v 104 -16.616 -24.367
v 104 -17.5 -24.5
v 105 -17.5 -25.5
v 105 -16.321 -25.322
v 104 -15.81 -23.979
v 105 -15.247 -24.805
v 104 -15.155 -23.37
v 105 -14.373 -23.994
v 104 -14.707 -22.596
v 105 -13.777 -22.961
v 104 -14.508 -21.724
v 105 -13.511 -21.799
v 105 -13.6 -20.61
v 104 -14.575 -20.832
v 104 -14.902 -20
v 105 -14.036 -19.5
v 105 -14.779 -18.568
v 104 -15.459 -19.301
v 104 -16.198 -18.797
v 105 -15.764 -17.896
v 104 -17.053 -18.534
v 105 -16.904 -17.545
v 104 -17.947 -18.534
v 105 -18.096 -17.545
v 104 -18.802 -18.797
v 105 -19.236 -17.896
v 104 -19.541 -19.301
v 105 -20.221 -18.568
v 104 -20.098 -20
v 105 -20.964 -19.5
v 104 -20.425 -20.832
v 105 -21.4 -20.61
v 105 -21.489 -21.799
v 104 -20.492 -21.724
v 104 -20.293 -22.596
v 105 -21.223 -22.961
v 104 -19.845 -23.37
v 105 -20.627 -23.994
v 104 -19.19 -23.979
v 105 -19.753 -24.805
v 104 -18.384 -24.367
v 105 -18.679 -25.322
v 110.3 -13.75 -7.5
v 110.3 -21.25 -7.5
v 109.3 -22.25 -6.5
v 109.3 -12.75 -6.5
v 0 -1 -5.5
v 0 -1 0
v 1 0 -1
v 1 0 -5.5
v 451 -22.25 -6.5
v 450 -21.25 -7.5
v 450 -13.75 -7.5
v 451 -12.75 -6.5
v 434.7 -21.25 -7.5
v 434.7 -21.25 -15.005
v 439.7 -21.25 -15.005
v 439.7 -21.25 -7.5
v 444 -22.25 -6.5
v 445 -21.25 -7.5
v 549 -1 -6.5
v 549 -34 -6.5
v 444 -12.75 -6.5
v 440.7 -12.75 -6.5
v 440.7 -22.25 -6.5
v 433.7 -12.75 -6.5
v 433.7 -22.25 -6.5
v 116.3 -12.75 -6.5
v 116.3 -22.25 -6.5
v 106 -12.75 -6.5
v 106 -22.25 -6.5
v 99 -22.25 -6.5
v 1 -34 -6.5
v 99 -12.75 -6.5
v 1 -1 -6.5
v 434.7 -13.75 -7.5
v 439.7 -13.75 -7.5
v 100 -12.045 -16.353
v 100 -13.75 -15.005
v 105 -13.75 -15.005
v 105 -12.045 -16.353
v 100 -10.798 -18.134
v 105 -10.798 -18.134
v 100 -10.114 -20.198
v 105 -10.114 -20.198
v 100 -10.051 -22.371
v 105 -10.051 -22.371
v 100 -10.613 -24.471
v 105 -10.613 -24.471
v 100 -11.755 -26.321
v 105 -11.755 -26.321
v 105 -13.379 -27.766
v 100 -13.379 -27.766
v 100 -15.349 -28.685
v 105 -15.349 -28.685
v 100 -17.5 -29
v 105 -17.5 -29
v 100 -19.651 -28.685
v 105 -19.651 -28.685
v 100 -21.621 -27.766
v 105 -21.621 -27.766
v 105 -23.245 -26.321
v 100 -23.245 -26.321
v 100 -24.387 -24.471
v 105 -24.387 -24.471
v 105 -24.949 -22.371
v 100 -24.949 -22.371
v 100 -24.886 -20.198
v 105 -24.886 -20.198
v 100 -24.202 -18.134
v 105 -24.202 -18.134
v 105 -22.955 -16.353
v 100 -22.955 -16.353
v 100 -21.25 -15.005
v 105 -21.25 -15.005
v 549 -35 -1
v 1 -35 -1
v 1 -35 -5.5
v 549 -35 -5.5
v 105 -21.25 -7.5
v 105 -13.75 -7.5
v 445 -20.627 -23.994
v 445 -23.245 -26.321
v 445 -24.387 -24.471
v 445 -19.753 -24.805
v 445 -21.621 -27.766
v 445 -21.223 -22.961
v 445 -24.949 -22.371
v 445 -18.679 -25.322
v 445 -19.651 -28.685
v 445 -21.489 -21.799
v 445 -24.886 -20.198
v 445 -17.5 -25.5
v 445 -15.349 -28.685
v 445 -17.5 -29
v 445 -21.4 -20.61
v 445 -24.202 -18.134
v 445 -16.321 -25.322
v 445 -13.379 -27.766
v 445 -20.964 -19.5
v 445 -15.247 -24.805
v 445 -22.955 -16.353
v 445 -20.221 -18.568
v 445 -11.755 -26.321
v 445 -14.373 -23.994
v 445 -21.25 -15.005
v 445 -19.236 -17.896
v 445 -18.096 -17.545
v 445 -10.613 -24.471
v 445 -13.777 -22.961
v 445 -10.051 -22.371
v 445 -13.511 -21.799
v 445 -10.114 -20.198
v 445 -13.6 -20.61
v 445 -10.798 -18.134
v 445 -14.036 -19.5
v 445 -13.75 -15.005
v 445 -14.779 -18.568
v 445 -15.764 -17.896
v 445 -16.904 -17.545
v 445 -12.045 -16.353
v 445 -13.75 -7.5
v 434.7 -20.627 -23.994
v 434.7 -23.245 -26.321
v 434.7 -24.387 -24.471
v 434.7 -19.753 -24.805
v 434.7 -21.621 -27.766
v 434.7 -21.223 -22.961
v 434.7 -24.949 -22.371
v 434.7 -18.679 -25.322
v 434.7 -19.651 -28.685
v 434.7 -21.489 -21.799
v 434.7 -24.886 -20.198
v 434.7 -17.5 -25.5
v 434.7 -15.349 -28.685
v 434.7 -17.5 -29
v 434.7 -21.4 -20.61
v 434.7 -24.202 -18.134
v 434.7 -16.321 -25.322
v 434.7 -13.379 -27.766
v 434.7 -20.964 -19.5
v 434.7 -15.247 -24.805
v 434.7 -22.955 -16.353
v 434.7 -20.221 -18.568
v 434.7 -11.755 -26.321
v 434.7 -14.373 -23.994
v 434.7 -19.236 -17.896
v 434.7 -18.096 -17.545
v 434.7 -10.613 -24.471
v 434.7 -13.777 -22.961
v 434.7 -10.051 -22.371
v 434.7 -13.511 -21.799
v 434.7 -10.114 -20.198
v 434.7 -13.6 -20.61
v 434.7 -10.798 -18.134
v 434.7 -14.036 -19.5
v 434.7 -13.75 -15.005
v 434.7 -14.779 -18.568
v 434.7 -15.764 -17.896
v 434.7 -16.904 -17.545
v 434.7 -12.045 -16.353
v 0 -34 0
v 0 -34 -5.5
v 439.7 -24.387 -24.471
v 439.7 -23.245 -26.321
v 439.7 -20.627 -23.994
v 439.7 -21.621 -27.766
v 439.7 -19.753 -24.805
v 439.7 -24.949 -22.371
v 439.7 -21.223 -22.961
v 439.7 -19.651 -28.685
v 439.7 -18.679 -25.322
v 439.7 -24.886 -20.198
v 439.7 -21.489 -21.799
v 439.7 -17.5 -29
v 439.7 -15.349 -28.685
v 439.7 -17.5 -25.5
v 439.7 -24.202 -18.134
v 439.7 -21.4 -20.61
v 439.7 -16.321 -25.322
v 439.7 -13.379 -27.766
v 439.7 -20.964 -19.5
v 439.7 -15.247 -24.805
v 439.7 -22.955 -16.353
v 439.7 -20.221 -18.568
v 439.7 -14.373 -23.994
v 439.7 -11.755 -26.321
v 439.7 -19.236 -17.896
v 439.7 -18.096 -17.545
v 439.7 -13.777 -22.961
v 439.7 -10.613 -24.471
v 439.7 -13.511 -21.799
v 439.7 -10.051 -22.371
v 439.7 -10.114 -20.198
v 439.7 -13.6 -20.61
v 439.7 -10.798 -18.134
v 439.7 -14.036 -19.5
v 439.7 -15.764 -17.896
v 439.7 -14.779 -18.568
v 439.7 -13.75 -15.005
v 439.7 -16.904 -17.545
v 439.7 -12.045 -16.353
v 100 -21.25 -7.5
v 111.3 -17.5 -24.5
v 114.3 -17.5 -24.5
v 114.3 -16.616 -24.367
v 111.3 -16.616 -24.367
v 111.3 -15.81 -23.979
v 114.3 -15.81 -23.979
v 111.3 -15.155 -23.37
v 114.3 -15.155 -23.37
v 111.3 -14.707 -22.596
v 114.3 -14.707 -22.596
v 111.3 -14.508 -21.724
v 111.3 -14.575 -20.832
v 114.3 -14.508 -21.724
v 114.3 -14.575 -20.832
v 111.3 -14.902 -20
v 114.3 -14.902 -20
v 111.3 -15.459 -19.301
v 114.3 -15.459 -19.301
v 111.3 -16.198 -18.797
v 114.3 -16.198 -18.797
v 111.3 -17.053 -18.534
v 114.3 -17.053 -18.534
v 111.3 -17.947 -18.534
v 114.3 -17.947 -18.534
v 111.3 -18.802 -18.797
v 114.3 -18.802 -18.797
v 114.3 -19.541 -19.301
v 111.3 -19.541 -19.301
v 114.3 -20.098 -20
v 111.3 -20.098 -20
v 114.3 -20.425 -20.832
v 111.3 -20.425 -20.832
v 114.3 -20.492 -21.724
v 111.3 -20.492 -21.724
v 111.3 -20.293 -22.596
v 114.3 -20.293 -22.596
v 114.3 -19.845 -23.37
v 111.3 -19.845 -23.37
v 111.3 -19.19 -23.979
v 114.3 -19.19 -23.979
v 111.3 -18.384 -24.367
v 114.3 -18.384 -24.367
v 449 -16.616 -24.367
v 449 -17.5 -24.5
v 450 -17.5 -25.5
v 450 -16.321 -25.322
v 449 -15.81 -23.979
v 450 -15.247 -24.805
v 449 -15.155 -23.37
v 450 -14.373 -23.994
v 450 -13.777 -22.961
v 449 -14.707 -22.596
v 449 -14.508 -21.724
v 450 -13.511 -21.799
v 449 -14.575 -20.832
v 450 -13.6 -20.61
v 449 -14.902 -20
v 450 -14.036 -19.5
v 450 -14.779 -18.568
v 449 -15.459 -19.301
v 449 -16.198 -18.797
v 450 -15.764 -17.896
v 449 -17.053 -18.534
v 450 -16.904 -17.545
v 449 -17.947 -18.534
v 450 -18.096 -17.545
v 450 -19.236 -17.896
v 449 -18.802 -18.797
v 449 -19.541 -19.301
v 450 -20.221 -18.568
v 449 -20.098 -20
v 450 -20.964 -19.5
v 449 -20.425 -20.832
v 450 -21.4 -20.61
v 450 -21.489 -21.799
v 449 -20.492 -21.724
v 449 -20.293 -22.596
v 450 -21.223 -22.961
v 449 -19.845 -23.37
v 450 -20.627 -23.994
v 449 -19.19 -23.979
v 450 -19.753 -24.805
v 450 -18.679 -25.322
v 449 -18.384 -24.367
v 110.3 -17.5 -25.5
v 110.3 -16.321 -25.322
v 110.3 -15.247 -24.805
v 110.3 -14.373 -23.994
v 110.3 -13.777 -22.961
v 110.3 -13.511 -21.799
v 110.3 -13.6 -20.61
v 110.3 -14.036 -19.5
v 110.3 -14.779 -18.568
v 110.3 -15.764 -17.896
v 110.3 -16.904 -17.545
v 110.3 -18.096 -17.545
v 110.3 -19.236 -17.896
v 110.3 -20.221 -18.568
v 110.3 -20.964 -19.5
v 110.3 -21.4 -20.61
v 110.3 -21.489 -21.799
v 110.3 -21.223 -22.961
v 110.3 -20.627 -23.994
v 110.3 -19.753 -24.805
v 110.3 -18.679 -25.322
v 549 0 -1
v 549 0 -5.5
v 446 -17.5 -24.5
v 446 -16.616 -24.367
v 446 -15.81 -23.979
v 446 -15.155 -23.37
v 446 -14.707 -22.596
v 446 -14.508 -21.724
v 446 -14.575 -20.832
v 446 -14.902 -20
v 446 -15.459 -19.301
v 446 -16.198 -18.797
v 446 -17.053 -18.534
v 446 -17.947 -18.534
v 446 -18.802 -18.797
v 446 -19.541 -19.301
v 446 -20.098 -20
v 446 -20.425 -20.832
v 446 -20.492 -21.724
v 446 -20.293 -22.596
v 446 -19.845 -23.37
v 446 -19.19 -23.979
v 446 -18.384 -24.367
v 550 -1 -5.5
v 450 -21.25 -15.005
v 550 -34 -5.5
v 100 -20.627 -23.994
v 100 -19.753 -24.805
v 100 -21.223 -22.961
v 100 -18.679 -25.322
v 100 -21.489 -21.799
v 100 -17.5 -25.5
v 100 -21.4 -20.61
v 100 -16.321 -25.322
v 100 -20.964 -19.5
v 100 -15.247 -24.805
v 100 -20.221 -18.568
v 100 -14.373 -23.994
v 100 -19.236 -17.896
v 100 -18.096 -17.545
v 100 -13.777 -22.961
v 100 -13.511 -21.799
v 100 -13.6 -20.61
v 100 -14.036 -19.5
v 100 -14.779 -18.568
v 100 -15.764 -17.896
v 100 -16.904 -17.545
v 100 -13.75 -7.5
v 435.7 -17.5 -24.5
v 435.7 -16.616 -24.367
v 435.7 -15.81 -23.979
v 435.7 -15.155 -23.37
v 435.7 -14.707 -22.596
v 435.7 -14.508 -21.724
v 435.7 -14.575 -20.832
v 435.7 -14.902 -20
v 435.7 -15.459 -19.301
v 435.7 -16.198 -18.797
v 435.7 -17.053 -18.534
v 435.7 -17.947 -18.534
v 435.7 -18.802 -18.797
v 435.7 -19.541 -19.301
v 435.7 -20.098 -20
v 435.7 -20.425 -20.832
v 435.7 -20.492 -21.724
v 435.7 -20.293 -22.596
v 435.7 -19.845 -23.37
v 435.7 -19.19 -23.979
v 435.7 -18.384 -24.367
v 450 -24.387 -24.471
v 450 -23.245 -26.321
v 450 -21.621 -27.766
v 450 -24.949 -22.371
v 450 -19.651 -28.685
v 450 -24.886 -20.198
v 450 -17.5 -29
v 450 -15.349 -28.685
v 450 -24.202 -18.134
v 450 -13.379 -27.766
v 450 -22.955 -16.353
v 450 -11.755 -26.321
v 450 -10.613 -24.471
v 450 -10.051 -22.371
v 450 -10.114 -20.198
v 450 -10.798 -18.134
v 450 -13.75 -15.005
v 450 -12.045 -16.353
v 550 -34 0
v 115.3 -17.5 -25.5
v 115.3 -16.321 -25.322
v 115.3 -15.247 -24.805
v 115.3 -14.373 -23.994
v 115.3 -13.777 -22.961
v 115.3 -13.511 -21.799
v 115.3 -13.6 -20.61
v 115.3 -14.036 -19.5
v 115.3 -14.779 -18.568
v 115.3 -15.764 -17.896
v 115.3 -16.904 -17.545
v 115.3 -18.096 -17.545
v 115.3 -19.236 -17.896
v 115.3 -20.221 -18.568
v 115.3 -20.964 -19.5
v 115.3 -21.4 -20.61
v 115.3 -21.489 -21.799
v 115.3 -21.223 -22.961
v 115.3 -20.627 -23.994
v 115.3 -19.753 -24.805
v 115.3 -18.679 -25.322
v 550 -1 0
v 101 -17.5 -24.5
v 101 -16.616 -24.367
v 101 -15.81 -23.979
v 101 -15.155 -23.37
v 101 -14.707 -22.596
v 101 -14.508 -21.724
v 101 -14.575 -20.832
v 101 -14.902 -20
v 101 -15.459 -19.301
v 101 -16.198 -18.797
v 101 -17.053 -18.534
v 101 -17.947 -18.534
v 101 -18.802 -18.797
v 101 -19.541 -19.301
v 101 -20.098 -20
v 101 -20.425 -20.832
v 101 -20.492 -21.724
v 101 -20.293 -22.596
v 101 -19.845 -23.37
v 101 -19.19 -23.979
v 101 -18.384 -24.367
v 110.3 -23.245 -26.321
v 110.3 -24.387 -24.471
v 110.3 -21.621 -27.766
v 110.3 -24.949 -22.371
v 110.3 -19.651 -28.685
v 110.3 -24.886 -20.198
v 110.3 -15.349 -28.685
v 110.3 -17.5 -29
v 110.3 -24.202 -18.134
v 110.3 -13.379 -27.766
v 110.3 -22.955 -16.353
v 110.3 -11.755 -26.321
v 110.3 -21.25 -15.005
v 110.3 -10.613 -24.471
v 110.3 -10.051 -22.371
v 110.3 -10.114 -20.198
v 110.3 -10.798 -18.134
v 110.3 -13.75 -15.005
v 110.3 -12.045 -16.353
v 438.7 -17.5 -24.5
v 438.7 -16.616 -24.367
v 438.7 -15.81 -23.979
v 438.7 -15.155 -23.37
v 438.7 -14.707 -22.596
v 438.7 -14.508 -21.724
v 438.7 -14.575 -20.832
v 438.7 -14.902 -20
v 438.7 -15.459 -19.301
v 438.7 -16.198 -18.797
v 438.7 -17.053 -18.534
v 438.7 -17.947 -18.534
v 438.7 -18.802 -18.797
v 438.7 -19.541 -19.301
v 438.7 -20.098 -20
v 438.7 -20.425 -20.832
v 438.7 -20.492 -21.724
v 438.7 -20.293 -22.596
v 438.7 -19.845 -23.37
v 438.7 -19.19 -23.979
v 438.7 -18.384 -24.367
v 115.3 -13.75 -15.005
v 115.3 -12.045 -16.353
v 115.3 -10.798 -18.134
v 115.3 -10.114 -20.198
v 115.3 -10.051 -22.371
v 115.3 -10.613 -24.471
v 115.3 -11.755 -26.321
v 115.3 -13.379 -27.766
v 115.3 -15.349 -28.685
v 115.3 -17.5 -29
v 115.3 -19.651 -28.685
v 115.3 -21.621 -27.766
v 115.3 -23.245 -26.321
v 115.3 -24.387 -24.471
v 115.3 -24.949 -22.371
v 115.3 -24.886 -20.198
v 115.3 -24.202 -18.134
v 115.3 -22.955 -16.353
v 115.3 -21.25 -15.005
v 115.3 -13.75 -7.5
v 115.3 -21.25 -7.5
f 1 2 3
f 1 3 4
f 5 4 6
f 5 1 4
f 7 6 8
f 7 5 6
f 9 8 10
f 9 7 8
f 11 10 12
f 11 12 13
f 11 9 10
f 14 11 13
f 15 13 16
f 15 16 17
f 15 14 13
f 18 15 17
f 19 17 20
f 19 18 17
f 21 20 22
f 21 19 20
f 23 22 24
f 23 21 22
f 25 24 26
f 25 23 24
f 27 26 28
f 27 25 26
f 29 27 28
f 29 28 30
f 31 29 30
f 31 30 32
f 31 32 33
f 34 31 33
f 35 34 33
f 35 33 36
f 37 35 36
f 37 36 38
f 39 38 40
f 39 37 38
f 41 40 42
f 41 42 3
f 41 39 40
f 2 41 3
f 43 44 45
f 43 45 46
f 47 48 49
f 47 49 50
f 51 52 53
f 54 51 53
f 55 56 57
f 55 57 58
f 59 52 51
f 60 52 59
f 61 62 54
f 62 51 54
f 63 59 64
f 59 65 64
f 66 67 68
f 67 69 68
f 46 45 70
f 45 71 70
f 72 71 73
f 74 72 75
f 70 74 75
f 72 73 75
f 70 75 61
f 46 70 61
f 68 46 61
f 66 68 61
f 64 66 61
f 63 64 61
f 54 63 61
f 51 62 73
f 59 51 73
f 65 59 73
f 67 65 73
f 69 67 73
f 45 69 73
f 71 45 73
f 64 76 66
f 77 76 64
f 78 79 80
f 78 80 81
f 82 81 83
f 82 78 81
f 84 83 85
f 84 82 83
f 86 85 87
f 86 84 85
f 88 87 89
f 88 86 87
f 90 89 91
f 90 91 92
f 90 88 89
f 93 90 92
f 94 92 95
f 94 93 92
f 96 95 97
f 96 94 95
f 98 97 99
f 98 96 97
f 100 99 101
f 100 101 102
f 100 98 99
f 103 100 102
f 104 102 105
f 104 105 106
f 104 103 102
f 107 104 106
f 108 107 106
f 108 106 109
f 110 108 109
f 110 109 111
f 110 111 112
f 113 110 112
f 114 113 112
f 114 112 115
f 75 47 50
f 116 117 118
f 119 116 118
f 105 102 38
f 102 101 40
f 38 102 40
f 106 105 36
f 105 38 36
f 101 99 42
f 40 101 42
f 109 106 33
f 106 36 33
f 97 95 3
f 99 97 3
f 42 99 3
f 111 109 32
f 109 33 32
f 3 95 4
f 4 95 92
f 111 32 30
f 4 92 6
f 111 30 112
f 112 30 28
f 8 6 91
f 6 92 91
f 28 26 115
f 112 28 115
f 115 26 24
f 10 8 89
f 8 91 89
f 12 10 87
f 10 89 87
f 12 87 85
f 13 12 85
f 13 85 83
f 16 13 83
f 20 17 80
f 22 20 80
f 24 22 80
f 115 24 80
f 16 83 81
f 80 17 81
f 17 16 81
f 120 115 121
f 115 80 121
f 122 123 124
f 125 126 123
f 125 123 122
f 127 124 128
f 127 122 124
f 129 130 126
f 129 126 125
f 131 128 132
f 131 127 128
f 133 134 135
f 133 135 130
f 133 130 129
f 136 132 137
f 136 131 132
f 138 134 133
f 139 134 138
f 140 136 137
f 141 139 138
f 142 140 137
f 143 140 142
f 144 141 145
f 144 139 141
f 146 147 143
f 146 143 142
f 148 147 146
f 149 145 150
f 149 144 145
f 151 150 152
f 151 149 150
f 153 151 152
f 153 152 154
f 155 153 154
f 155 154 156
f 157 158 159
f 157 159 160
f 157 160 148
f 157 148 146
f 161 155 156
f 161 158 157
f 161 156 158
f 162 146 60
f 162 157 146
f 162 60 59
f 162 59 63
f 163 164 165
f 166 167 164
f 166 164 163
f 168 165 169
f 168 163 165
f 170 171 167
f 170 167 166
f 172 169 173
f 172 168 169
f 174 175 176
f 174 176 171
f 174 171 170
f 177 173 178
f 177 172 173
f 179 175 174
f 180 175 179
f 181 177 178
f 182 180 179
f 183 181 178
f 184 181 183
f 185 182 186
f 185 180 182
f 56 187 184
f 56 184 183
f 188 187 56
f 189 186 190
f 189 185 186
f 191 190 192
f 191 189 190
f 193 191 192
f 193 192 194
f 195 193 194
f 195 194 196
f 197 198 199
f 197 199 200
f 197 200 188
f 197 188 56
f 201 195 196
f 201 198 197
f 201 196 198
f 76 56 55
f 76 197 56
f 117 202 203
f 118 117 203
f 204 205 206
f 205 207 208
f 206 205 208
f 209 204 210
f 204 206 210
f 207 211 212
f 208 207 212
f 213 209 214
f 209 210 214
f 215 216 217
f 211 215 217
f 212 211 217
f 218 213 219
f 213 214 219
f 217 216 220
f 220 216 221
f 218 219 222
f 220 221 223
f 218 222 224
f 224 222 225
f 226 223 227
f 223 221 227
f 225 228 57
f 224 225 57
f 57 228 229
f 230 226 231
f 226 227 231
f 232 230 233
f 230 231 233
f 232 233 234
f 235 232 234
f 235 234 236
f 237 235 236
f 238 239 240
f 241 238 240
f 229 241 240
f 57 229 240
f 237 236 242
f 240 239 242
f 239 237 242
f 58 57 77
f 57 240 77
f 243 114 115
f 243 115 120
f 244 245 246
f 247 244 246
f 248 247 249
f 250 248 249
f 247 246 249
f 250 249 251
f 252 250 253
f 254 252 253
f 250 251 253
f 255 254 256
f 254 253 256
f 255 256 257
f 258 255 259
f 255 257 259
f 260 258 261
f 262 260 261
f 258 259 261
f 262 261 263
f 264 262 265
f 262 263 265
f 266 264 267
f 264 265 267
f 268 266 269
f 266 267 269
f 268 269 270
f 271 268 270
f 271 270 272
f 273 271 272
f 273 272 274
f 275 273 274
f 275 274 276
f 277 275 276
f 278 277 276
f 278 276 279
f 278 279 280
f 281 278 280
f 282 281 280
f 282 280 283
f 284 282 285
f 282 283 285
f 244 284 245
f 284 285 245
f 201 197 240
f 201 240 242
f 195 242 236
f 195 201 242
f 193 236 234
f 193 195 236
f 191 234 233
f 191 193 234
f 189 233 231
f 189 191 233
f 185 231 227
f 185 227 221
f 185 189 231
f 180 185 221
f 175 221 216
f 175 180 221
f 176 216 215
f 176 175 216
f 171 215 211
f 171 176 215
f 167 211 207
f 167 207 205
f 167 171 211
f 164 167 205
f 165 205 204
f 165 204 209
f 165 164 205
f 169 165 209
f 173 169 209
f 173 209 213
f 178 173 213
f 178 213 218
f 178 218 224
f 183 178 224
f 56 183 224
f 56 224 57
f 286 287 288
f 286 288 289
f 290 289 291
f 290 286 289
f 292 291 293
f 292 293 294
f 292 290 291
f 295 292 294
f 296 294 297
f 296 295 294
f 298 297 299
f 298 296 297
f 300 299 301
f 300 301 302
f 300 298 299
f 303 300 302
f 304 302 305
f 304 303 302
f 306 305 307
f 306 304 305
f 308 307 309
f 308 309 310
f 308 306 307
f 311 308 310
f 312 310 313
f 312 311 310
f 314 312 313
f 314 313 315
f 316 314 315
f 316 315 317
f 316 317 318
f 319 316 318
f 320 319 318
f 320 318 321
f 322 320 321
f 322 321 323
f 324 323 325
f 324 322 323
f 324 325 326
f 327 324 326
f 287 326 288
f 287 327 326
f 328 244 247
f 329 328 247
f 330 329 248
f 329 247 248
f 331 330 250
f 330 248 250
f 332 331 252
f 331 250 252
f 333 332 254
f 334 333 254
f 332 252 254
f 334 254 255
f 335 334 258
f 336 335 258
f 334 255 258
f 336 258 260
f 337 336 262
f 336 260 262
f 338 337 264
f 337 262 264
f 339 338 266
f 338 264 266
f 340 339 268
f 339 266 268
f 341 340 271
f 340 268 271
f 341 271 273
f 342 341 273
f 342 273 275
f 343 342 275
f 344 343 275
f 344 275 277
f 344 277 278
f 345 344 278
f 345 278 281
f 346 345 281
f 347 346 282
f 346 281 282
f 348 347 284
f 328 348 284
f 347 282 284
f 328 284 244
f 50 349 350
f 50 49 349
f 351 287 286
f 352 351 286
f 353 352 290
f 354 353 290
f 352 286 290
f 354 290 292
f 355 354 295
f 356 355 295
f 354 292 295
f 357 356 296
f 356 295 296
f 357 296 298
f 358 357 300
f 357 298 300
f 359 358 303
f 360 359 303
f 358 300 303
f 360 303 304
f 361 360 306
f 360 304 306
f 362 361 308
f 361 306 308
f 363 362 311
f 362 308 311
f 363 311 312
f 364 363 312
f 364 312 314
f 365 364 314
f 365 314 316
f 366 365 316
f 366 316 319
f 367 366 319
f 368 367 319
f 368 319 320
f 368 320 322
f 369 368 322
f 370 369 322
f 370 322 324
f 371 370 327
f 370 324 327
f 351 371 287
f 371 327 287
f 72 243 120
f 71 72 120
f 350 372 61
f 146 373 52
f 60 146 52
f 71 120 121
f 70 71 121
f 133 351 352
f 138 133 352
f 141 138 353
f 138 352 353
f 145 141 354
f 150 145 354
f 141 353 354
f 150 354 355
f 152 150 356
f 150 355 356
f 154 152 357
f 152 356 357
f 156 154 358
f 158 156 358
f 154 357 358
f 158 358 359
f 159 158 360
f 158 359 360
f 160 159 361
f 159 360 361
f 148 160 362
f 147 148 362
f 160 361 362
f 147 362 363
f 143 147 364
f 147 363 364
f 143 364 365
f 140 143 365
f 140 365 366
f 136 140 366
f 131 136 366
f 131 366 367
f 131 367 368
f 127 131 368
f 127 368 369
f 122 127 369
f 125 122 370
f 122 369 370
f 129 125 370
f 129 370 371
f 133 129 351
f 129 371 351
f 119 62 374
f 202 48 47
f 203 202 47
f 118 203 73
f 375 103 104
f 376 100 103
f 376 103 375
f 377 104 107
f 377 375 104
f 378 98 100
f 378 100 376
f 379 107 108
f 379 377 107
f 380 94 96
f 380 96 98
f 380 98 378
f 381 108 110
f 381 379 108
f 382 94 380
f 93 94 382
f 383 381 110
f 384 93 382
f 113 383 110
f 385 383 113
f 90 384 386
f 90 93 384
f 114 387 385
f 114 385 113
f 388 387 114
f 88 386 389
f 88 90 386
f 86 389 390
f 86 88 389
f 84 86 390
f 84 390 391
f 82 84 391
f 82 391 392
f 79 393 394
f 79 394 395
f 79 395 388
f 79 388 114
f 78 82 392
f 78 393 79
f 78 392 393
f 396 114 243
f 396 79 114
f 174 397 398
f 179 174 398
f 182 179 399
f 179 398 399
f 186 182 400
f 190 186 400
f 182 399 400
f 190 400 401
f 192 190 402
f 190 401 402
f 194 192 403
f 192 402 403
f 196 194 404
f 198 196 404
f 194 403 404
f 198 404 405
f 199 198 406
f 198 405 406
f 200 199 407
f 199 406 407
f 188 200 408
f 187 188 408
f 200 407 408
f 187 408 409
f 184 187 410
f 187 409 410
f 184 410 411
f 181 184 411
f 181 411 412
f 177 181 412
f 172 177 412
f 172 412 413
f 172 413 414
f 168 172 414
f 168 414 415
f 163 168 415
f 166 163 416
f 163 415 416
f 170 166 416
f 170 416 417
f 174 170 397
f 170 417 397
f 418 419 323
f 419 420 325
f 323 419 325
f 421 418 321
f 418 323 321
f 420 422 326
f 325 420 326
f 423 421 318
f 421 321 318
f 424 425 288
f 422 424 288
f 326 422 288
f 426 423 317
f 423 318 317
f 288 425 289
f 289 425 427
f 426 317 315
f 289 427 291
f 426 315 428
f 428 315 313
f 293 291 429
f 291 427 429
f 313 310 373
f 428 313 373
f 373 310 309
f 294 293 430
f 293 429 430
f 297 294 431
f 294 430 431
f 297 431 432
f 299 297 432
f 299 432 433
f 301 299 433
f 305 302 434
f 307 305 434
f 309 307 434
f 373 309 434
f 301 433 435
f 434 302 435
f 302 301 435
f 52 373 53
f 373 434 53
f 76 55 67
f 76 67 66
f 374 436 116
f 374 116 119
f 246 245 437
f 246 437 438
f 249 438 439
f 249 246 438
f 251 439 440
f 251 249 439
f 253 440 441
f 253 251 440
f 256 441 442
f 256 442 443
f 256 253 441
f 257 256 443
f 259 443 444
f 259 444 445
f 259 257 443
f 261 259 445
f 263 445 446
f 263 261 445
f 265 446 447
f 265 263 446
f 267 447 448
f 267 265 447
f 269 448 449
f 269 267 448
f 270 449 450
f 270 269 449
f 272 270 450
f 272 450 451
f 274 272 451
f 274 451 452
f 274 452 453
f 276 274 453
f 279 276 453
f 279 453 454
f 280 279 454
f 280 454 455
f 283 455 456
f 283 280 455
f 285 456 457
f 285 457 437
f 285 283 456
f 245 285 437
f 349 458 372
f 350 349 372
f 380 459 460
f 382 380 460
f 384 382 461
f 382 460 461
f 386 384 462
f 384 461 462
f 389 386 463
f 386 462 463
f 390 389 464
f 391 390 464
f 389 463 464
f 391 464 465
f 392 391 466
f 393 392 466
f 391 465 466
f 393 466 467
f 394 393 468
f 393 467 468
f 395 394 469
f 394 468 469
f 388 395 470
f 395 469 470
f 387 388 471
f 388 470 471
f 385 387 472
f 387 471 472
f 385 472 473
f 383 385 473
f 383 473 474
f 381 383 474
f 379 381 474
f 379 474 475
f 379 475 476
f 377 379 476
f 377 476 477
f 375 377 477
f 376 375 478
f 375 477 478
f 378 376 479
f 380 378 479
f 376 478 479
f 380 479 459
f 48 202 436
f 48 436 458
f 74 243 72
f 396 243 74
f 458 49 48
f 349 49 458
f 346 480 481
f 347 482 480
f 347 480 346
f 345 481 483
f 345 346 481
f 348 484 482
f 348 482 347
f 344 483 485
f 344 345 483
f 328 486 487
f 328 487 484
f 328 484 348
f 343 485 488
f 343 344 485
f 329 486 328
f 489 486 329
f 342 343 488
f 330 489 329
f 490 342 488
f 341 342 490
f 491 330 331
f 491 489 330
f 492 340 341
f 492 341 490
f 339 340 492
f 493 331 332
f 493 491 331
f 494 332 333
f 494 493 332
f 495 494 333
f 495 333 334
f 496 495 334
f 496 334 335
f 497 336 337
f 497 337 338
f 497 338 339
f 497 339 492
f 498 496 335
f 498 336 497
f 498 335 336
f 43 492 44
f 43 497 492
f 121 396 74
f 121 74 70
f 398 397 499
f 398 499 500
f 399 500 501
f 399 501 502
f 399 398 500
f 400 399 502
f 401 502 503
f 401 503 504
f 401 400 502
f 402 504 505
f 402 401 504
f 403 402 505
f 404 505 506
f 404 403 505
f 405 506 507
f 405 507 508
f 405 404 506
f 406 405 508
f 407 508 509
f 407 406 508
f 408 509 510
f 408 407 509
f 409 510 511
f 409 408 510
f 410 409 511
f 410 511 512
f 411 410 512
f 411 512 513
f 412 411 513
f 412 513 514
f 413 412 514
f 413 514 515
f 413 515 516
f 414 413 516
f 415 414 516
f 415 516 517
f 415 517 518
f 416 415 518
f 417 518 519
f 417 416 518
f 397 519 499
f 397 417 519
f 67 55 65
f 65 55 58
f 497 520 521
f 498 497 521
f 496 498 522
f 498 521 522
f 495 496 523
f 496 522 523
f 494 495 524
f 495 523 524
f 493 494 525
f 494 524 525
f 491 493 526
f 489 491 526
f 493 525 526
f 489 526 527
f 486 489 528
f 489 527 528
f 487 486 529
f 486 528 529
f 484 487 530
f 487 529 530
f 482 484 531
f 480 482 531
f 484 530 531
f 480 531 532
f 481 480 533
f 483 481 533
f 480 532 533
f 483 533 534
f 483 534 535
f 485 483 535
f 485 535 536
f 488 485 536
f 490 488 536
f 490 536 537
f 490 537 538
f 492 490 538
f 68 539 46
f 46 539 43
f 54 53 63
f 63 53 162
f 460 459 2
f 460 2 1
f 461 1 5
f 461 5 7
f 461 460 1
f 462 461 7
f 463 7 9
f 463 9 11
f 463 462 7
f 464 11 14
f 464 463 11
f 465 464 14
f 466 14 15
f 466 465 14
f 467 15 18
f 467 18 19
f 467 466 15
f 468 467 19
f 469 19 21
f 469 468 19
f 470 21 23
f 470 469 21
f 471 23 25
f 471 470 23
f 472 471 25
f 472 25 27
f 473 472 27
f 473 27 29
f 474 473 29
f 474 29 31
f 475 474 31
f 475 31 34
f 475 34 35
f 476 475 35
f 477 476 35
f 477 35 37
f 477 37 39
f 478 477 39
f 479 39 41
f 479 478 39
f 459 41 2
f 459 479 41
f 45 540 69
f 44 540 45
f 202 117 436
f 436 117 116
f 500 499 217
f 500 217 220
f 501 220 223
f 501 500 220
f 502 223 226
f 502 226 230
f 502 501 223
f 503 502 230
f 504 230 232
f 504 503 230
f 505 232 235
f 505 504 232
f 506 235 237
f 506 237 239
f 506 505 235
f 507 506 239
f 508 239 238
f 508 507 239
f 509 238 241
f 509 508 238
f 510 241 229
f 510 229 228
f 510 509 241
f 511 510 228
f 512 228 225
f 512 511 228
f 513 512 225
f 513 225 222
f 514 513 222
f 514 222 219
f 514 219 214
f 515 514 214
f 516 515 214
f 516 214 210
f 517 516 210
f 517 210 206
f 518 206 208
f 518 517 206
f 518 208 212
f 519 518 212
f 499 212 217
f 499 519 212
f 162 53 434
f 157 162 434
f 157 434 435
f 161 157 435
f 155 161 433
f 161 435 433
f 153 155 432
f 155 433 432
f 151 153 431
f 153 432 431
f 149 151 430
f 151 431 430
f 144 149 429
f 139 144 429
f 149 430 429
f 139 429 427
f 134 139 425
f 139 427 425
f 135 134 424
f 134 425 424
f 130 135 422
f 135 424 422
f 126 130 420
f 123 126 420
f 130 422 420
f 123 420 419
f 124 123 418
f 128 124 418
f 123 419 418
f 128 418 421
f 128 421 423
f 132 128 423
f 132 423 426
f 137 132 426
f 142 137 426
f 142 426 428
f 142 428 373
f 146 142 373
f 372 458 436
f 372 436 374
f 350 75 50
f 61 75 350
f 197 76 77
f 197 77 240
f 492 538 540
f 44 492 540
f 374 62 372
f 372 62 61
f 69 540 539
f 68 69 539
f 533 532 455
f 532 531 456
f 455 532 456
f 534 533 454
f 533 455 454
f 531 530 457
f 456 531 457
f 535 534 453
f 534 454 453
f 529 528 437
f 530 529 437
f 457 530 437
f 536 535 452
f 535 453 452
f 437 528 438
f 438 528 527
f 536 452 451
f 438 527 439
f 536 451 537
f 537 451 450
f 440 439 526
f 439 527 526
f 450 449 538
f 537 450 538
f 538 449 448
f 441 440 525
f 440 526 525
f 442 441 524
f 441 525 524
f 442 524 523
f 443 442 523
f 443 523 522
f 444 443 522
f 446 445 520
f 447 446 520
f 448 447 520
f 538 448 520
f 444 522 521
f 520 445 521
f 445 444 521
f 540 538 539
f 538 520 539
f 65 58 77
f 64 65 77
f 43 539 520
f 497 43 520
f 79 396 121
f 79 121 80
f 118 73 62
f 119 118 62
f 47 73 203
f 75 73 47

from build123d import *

# Parameters (mm, degrees)
SKETCH_1_W               = 6.5
SKETCH_1_H               = 35
EXTRUDE_1_DEPTH          = 550
SKETCH_3_R               = 3
EXTRUDE_2_DEPTH          = 5
MIRROR_2_COPY_1_SKETCH_R = 3
MIRROR_2_COPY_1_DEPTH    = 5
CHAMFER_1_SIZE           = 1
CHAMFER_2_SIZE           = 1


with BuildPart() as part:
    # 草图1 → 凸台-拉伸1 (new body)
    with BuildSketch(Plane(origin=(0, 0, 0), x_dir=(0, 0, -1), z_dir=(1, 0, 0))):
        with Locations((3.25, -17.5)):
            Rectangle(SKETCH_1_W, SKETCH_1_H)
    extrude(amount=EXTRUDE_1_DEPTH)

    # 草图3 → 凸台-拉伸2 (add)
    with BuildSketch(Plane(origin=(450, 0, 0), x_dir=(0, 0, -1), z_dir=(1, 0, 0))):
        with BuildLine():
            Line((6.5, -21.25), (6.5, -13.75))
            Line((6.5, -13.75), (15.004809472, -13.75))
            ThreePointArc((15.004809472, -13.75), (29, -17.5), (15.004809472, -21.25))
            Line((15.004809472, -21.25), (6.5, -21.25))
        make_face()
        with Locations((21.5, -17.5)):
            Circle(SKETCH_3_R, mode=Mode.SUBTRACT)
    extrude_2 = extrude(amount=-EXTRUDE_2_DEPTH)

    # 镜向1: 凸台-拉伸2 across plane
    add(extrude_2.mirror(Plane.ZY.offset(-442.35)))

    # 镜向2: 凸台-拉伸2 across plane
    add(extrude_2.mirror(Plane(origin=(275, 0, 0), x_dir=(0, 0, 1), z_dir=(1, 0, 0))))

    # 镜向2 copy 1 sketch → 镜向2 copy 1 (add)
    with BuildSketch(Plane(origin=(115.3, 0, 0), x_dir=(0, 0, -1), z_dir=(1, 0, 0))):
        with BuildLine():
            Line((6.5, -21.25), (6.5, -13.75))
            Line((6.5, -13.75), (15.004809472, -13.75))
            ThreePointArc((15.004809472, -13.75), (29, -17.5), (15.004809472, -21.25))
            Line((15.004809472, -21.25), (6.5, -21.25))
        make_face()
        with Locations((21.5, -17.5)):
            Circle(MIRROR_2_COPY_1_SKETCH_R, mode=Mode.SUBTRACT)
    extrude(amount=-MIRROR_2_COPY_1_DEPTH)

    # 倒角1
    chamfer_1_edges = [part.edges().sort_by_distance(p)[0] for p in [
        (550, -17.5, -6.5),
        (550, 0, -3.25),
        (445, -17.5, -6.5),
        (447.5, -21.25, -6.5),
        (447.5, -13.75, -6.5),
        (445, -17.5, -18.5),
        (450, -17.5, -6.5),
        (450, -17.5, -18.5),
        (439.7, -17.5, -6.5),
        (434.7, -17.5, -18.5),
        (434.7, -17.5, -6.5),
        (437.2, -13.75, -6.5),
        (437.2, -21.25, -6.5),
        (439.7, -17.5, -18.5),
        (105, -17.5, -6.5),
        (100, -17.5, -6.5),
        (0, 0, -3.25),
        (102.5, -13.75, -6.5),
        (102.5, -21.25, -6.5),
        (0, -17.5, -6.5),
        (0, -35, -3.25),
        (110.3, -17.5, -6.5),
        (112.8, -21.25, -6.5),
        (112.8, -13.75, -6.5),
        (115.3, -17.5, -6.5),
        (275, 0, 0),
        (275, 0, -6.5),
        (275, -35, -6.5),
        (275, -35, 0),
        (550, -35, -3.25),
    ]]
    chamfer(chamfer_1_edges, length=CHAMFER_1_SIZE)

    # 倒角2
    chamfer_2_edges = [part.edges().sort_by_distance(p)[0] for p in [
        (100, -17.5, -18.5),
        (105, -17.5, -18.5),
        (110.3, -17.5, -18.5),
        (115.3, -17.5, -18.5),
    ]]
    chamfer(chamfer_2_edges, length=CHAMFER_2_SIZE)


solid = part.part
